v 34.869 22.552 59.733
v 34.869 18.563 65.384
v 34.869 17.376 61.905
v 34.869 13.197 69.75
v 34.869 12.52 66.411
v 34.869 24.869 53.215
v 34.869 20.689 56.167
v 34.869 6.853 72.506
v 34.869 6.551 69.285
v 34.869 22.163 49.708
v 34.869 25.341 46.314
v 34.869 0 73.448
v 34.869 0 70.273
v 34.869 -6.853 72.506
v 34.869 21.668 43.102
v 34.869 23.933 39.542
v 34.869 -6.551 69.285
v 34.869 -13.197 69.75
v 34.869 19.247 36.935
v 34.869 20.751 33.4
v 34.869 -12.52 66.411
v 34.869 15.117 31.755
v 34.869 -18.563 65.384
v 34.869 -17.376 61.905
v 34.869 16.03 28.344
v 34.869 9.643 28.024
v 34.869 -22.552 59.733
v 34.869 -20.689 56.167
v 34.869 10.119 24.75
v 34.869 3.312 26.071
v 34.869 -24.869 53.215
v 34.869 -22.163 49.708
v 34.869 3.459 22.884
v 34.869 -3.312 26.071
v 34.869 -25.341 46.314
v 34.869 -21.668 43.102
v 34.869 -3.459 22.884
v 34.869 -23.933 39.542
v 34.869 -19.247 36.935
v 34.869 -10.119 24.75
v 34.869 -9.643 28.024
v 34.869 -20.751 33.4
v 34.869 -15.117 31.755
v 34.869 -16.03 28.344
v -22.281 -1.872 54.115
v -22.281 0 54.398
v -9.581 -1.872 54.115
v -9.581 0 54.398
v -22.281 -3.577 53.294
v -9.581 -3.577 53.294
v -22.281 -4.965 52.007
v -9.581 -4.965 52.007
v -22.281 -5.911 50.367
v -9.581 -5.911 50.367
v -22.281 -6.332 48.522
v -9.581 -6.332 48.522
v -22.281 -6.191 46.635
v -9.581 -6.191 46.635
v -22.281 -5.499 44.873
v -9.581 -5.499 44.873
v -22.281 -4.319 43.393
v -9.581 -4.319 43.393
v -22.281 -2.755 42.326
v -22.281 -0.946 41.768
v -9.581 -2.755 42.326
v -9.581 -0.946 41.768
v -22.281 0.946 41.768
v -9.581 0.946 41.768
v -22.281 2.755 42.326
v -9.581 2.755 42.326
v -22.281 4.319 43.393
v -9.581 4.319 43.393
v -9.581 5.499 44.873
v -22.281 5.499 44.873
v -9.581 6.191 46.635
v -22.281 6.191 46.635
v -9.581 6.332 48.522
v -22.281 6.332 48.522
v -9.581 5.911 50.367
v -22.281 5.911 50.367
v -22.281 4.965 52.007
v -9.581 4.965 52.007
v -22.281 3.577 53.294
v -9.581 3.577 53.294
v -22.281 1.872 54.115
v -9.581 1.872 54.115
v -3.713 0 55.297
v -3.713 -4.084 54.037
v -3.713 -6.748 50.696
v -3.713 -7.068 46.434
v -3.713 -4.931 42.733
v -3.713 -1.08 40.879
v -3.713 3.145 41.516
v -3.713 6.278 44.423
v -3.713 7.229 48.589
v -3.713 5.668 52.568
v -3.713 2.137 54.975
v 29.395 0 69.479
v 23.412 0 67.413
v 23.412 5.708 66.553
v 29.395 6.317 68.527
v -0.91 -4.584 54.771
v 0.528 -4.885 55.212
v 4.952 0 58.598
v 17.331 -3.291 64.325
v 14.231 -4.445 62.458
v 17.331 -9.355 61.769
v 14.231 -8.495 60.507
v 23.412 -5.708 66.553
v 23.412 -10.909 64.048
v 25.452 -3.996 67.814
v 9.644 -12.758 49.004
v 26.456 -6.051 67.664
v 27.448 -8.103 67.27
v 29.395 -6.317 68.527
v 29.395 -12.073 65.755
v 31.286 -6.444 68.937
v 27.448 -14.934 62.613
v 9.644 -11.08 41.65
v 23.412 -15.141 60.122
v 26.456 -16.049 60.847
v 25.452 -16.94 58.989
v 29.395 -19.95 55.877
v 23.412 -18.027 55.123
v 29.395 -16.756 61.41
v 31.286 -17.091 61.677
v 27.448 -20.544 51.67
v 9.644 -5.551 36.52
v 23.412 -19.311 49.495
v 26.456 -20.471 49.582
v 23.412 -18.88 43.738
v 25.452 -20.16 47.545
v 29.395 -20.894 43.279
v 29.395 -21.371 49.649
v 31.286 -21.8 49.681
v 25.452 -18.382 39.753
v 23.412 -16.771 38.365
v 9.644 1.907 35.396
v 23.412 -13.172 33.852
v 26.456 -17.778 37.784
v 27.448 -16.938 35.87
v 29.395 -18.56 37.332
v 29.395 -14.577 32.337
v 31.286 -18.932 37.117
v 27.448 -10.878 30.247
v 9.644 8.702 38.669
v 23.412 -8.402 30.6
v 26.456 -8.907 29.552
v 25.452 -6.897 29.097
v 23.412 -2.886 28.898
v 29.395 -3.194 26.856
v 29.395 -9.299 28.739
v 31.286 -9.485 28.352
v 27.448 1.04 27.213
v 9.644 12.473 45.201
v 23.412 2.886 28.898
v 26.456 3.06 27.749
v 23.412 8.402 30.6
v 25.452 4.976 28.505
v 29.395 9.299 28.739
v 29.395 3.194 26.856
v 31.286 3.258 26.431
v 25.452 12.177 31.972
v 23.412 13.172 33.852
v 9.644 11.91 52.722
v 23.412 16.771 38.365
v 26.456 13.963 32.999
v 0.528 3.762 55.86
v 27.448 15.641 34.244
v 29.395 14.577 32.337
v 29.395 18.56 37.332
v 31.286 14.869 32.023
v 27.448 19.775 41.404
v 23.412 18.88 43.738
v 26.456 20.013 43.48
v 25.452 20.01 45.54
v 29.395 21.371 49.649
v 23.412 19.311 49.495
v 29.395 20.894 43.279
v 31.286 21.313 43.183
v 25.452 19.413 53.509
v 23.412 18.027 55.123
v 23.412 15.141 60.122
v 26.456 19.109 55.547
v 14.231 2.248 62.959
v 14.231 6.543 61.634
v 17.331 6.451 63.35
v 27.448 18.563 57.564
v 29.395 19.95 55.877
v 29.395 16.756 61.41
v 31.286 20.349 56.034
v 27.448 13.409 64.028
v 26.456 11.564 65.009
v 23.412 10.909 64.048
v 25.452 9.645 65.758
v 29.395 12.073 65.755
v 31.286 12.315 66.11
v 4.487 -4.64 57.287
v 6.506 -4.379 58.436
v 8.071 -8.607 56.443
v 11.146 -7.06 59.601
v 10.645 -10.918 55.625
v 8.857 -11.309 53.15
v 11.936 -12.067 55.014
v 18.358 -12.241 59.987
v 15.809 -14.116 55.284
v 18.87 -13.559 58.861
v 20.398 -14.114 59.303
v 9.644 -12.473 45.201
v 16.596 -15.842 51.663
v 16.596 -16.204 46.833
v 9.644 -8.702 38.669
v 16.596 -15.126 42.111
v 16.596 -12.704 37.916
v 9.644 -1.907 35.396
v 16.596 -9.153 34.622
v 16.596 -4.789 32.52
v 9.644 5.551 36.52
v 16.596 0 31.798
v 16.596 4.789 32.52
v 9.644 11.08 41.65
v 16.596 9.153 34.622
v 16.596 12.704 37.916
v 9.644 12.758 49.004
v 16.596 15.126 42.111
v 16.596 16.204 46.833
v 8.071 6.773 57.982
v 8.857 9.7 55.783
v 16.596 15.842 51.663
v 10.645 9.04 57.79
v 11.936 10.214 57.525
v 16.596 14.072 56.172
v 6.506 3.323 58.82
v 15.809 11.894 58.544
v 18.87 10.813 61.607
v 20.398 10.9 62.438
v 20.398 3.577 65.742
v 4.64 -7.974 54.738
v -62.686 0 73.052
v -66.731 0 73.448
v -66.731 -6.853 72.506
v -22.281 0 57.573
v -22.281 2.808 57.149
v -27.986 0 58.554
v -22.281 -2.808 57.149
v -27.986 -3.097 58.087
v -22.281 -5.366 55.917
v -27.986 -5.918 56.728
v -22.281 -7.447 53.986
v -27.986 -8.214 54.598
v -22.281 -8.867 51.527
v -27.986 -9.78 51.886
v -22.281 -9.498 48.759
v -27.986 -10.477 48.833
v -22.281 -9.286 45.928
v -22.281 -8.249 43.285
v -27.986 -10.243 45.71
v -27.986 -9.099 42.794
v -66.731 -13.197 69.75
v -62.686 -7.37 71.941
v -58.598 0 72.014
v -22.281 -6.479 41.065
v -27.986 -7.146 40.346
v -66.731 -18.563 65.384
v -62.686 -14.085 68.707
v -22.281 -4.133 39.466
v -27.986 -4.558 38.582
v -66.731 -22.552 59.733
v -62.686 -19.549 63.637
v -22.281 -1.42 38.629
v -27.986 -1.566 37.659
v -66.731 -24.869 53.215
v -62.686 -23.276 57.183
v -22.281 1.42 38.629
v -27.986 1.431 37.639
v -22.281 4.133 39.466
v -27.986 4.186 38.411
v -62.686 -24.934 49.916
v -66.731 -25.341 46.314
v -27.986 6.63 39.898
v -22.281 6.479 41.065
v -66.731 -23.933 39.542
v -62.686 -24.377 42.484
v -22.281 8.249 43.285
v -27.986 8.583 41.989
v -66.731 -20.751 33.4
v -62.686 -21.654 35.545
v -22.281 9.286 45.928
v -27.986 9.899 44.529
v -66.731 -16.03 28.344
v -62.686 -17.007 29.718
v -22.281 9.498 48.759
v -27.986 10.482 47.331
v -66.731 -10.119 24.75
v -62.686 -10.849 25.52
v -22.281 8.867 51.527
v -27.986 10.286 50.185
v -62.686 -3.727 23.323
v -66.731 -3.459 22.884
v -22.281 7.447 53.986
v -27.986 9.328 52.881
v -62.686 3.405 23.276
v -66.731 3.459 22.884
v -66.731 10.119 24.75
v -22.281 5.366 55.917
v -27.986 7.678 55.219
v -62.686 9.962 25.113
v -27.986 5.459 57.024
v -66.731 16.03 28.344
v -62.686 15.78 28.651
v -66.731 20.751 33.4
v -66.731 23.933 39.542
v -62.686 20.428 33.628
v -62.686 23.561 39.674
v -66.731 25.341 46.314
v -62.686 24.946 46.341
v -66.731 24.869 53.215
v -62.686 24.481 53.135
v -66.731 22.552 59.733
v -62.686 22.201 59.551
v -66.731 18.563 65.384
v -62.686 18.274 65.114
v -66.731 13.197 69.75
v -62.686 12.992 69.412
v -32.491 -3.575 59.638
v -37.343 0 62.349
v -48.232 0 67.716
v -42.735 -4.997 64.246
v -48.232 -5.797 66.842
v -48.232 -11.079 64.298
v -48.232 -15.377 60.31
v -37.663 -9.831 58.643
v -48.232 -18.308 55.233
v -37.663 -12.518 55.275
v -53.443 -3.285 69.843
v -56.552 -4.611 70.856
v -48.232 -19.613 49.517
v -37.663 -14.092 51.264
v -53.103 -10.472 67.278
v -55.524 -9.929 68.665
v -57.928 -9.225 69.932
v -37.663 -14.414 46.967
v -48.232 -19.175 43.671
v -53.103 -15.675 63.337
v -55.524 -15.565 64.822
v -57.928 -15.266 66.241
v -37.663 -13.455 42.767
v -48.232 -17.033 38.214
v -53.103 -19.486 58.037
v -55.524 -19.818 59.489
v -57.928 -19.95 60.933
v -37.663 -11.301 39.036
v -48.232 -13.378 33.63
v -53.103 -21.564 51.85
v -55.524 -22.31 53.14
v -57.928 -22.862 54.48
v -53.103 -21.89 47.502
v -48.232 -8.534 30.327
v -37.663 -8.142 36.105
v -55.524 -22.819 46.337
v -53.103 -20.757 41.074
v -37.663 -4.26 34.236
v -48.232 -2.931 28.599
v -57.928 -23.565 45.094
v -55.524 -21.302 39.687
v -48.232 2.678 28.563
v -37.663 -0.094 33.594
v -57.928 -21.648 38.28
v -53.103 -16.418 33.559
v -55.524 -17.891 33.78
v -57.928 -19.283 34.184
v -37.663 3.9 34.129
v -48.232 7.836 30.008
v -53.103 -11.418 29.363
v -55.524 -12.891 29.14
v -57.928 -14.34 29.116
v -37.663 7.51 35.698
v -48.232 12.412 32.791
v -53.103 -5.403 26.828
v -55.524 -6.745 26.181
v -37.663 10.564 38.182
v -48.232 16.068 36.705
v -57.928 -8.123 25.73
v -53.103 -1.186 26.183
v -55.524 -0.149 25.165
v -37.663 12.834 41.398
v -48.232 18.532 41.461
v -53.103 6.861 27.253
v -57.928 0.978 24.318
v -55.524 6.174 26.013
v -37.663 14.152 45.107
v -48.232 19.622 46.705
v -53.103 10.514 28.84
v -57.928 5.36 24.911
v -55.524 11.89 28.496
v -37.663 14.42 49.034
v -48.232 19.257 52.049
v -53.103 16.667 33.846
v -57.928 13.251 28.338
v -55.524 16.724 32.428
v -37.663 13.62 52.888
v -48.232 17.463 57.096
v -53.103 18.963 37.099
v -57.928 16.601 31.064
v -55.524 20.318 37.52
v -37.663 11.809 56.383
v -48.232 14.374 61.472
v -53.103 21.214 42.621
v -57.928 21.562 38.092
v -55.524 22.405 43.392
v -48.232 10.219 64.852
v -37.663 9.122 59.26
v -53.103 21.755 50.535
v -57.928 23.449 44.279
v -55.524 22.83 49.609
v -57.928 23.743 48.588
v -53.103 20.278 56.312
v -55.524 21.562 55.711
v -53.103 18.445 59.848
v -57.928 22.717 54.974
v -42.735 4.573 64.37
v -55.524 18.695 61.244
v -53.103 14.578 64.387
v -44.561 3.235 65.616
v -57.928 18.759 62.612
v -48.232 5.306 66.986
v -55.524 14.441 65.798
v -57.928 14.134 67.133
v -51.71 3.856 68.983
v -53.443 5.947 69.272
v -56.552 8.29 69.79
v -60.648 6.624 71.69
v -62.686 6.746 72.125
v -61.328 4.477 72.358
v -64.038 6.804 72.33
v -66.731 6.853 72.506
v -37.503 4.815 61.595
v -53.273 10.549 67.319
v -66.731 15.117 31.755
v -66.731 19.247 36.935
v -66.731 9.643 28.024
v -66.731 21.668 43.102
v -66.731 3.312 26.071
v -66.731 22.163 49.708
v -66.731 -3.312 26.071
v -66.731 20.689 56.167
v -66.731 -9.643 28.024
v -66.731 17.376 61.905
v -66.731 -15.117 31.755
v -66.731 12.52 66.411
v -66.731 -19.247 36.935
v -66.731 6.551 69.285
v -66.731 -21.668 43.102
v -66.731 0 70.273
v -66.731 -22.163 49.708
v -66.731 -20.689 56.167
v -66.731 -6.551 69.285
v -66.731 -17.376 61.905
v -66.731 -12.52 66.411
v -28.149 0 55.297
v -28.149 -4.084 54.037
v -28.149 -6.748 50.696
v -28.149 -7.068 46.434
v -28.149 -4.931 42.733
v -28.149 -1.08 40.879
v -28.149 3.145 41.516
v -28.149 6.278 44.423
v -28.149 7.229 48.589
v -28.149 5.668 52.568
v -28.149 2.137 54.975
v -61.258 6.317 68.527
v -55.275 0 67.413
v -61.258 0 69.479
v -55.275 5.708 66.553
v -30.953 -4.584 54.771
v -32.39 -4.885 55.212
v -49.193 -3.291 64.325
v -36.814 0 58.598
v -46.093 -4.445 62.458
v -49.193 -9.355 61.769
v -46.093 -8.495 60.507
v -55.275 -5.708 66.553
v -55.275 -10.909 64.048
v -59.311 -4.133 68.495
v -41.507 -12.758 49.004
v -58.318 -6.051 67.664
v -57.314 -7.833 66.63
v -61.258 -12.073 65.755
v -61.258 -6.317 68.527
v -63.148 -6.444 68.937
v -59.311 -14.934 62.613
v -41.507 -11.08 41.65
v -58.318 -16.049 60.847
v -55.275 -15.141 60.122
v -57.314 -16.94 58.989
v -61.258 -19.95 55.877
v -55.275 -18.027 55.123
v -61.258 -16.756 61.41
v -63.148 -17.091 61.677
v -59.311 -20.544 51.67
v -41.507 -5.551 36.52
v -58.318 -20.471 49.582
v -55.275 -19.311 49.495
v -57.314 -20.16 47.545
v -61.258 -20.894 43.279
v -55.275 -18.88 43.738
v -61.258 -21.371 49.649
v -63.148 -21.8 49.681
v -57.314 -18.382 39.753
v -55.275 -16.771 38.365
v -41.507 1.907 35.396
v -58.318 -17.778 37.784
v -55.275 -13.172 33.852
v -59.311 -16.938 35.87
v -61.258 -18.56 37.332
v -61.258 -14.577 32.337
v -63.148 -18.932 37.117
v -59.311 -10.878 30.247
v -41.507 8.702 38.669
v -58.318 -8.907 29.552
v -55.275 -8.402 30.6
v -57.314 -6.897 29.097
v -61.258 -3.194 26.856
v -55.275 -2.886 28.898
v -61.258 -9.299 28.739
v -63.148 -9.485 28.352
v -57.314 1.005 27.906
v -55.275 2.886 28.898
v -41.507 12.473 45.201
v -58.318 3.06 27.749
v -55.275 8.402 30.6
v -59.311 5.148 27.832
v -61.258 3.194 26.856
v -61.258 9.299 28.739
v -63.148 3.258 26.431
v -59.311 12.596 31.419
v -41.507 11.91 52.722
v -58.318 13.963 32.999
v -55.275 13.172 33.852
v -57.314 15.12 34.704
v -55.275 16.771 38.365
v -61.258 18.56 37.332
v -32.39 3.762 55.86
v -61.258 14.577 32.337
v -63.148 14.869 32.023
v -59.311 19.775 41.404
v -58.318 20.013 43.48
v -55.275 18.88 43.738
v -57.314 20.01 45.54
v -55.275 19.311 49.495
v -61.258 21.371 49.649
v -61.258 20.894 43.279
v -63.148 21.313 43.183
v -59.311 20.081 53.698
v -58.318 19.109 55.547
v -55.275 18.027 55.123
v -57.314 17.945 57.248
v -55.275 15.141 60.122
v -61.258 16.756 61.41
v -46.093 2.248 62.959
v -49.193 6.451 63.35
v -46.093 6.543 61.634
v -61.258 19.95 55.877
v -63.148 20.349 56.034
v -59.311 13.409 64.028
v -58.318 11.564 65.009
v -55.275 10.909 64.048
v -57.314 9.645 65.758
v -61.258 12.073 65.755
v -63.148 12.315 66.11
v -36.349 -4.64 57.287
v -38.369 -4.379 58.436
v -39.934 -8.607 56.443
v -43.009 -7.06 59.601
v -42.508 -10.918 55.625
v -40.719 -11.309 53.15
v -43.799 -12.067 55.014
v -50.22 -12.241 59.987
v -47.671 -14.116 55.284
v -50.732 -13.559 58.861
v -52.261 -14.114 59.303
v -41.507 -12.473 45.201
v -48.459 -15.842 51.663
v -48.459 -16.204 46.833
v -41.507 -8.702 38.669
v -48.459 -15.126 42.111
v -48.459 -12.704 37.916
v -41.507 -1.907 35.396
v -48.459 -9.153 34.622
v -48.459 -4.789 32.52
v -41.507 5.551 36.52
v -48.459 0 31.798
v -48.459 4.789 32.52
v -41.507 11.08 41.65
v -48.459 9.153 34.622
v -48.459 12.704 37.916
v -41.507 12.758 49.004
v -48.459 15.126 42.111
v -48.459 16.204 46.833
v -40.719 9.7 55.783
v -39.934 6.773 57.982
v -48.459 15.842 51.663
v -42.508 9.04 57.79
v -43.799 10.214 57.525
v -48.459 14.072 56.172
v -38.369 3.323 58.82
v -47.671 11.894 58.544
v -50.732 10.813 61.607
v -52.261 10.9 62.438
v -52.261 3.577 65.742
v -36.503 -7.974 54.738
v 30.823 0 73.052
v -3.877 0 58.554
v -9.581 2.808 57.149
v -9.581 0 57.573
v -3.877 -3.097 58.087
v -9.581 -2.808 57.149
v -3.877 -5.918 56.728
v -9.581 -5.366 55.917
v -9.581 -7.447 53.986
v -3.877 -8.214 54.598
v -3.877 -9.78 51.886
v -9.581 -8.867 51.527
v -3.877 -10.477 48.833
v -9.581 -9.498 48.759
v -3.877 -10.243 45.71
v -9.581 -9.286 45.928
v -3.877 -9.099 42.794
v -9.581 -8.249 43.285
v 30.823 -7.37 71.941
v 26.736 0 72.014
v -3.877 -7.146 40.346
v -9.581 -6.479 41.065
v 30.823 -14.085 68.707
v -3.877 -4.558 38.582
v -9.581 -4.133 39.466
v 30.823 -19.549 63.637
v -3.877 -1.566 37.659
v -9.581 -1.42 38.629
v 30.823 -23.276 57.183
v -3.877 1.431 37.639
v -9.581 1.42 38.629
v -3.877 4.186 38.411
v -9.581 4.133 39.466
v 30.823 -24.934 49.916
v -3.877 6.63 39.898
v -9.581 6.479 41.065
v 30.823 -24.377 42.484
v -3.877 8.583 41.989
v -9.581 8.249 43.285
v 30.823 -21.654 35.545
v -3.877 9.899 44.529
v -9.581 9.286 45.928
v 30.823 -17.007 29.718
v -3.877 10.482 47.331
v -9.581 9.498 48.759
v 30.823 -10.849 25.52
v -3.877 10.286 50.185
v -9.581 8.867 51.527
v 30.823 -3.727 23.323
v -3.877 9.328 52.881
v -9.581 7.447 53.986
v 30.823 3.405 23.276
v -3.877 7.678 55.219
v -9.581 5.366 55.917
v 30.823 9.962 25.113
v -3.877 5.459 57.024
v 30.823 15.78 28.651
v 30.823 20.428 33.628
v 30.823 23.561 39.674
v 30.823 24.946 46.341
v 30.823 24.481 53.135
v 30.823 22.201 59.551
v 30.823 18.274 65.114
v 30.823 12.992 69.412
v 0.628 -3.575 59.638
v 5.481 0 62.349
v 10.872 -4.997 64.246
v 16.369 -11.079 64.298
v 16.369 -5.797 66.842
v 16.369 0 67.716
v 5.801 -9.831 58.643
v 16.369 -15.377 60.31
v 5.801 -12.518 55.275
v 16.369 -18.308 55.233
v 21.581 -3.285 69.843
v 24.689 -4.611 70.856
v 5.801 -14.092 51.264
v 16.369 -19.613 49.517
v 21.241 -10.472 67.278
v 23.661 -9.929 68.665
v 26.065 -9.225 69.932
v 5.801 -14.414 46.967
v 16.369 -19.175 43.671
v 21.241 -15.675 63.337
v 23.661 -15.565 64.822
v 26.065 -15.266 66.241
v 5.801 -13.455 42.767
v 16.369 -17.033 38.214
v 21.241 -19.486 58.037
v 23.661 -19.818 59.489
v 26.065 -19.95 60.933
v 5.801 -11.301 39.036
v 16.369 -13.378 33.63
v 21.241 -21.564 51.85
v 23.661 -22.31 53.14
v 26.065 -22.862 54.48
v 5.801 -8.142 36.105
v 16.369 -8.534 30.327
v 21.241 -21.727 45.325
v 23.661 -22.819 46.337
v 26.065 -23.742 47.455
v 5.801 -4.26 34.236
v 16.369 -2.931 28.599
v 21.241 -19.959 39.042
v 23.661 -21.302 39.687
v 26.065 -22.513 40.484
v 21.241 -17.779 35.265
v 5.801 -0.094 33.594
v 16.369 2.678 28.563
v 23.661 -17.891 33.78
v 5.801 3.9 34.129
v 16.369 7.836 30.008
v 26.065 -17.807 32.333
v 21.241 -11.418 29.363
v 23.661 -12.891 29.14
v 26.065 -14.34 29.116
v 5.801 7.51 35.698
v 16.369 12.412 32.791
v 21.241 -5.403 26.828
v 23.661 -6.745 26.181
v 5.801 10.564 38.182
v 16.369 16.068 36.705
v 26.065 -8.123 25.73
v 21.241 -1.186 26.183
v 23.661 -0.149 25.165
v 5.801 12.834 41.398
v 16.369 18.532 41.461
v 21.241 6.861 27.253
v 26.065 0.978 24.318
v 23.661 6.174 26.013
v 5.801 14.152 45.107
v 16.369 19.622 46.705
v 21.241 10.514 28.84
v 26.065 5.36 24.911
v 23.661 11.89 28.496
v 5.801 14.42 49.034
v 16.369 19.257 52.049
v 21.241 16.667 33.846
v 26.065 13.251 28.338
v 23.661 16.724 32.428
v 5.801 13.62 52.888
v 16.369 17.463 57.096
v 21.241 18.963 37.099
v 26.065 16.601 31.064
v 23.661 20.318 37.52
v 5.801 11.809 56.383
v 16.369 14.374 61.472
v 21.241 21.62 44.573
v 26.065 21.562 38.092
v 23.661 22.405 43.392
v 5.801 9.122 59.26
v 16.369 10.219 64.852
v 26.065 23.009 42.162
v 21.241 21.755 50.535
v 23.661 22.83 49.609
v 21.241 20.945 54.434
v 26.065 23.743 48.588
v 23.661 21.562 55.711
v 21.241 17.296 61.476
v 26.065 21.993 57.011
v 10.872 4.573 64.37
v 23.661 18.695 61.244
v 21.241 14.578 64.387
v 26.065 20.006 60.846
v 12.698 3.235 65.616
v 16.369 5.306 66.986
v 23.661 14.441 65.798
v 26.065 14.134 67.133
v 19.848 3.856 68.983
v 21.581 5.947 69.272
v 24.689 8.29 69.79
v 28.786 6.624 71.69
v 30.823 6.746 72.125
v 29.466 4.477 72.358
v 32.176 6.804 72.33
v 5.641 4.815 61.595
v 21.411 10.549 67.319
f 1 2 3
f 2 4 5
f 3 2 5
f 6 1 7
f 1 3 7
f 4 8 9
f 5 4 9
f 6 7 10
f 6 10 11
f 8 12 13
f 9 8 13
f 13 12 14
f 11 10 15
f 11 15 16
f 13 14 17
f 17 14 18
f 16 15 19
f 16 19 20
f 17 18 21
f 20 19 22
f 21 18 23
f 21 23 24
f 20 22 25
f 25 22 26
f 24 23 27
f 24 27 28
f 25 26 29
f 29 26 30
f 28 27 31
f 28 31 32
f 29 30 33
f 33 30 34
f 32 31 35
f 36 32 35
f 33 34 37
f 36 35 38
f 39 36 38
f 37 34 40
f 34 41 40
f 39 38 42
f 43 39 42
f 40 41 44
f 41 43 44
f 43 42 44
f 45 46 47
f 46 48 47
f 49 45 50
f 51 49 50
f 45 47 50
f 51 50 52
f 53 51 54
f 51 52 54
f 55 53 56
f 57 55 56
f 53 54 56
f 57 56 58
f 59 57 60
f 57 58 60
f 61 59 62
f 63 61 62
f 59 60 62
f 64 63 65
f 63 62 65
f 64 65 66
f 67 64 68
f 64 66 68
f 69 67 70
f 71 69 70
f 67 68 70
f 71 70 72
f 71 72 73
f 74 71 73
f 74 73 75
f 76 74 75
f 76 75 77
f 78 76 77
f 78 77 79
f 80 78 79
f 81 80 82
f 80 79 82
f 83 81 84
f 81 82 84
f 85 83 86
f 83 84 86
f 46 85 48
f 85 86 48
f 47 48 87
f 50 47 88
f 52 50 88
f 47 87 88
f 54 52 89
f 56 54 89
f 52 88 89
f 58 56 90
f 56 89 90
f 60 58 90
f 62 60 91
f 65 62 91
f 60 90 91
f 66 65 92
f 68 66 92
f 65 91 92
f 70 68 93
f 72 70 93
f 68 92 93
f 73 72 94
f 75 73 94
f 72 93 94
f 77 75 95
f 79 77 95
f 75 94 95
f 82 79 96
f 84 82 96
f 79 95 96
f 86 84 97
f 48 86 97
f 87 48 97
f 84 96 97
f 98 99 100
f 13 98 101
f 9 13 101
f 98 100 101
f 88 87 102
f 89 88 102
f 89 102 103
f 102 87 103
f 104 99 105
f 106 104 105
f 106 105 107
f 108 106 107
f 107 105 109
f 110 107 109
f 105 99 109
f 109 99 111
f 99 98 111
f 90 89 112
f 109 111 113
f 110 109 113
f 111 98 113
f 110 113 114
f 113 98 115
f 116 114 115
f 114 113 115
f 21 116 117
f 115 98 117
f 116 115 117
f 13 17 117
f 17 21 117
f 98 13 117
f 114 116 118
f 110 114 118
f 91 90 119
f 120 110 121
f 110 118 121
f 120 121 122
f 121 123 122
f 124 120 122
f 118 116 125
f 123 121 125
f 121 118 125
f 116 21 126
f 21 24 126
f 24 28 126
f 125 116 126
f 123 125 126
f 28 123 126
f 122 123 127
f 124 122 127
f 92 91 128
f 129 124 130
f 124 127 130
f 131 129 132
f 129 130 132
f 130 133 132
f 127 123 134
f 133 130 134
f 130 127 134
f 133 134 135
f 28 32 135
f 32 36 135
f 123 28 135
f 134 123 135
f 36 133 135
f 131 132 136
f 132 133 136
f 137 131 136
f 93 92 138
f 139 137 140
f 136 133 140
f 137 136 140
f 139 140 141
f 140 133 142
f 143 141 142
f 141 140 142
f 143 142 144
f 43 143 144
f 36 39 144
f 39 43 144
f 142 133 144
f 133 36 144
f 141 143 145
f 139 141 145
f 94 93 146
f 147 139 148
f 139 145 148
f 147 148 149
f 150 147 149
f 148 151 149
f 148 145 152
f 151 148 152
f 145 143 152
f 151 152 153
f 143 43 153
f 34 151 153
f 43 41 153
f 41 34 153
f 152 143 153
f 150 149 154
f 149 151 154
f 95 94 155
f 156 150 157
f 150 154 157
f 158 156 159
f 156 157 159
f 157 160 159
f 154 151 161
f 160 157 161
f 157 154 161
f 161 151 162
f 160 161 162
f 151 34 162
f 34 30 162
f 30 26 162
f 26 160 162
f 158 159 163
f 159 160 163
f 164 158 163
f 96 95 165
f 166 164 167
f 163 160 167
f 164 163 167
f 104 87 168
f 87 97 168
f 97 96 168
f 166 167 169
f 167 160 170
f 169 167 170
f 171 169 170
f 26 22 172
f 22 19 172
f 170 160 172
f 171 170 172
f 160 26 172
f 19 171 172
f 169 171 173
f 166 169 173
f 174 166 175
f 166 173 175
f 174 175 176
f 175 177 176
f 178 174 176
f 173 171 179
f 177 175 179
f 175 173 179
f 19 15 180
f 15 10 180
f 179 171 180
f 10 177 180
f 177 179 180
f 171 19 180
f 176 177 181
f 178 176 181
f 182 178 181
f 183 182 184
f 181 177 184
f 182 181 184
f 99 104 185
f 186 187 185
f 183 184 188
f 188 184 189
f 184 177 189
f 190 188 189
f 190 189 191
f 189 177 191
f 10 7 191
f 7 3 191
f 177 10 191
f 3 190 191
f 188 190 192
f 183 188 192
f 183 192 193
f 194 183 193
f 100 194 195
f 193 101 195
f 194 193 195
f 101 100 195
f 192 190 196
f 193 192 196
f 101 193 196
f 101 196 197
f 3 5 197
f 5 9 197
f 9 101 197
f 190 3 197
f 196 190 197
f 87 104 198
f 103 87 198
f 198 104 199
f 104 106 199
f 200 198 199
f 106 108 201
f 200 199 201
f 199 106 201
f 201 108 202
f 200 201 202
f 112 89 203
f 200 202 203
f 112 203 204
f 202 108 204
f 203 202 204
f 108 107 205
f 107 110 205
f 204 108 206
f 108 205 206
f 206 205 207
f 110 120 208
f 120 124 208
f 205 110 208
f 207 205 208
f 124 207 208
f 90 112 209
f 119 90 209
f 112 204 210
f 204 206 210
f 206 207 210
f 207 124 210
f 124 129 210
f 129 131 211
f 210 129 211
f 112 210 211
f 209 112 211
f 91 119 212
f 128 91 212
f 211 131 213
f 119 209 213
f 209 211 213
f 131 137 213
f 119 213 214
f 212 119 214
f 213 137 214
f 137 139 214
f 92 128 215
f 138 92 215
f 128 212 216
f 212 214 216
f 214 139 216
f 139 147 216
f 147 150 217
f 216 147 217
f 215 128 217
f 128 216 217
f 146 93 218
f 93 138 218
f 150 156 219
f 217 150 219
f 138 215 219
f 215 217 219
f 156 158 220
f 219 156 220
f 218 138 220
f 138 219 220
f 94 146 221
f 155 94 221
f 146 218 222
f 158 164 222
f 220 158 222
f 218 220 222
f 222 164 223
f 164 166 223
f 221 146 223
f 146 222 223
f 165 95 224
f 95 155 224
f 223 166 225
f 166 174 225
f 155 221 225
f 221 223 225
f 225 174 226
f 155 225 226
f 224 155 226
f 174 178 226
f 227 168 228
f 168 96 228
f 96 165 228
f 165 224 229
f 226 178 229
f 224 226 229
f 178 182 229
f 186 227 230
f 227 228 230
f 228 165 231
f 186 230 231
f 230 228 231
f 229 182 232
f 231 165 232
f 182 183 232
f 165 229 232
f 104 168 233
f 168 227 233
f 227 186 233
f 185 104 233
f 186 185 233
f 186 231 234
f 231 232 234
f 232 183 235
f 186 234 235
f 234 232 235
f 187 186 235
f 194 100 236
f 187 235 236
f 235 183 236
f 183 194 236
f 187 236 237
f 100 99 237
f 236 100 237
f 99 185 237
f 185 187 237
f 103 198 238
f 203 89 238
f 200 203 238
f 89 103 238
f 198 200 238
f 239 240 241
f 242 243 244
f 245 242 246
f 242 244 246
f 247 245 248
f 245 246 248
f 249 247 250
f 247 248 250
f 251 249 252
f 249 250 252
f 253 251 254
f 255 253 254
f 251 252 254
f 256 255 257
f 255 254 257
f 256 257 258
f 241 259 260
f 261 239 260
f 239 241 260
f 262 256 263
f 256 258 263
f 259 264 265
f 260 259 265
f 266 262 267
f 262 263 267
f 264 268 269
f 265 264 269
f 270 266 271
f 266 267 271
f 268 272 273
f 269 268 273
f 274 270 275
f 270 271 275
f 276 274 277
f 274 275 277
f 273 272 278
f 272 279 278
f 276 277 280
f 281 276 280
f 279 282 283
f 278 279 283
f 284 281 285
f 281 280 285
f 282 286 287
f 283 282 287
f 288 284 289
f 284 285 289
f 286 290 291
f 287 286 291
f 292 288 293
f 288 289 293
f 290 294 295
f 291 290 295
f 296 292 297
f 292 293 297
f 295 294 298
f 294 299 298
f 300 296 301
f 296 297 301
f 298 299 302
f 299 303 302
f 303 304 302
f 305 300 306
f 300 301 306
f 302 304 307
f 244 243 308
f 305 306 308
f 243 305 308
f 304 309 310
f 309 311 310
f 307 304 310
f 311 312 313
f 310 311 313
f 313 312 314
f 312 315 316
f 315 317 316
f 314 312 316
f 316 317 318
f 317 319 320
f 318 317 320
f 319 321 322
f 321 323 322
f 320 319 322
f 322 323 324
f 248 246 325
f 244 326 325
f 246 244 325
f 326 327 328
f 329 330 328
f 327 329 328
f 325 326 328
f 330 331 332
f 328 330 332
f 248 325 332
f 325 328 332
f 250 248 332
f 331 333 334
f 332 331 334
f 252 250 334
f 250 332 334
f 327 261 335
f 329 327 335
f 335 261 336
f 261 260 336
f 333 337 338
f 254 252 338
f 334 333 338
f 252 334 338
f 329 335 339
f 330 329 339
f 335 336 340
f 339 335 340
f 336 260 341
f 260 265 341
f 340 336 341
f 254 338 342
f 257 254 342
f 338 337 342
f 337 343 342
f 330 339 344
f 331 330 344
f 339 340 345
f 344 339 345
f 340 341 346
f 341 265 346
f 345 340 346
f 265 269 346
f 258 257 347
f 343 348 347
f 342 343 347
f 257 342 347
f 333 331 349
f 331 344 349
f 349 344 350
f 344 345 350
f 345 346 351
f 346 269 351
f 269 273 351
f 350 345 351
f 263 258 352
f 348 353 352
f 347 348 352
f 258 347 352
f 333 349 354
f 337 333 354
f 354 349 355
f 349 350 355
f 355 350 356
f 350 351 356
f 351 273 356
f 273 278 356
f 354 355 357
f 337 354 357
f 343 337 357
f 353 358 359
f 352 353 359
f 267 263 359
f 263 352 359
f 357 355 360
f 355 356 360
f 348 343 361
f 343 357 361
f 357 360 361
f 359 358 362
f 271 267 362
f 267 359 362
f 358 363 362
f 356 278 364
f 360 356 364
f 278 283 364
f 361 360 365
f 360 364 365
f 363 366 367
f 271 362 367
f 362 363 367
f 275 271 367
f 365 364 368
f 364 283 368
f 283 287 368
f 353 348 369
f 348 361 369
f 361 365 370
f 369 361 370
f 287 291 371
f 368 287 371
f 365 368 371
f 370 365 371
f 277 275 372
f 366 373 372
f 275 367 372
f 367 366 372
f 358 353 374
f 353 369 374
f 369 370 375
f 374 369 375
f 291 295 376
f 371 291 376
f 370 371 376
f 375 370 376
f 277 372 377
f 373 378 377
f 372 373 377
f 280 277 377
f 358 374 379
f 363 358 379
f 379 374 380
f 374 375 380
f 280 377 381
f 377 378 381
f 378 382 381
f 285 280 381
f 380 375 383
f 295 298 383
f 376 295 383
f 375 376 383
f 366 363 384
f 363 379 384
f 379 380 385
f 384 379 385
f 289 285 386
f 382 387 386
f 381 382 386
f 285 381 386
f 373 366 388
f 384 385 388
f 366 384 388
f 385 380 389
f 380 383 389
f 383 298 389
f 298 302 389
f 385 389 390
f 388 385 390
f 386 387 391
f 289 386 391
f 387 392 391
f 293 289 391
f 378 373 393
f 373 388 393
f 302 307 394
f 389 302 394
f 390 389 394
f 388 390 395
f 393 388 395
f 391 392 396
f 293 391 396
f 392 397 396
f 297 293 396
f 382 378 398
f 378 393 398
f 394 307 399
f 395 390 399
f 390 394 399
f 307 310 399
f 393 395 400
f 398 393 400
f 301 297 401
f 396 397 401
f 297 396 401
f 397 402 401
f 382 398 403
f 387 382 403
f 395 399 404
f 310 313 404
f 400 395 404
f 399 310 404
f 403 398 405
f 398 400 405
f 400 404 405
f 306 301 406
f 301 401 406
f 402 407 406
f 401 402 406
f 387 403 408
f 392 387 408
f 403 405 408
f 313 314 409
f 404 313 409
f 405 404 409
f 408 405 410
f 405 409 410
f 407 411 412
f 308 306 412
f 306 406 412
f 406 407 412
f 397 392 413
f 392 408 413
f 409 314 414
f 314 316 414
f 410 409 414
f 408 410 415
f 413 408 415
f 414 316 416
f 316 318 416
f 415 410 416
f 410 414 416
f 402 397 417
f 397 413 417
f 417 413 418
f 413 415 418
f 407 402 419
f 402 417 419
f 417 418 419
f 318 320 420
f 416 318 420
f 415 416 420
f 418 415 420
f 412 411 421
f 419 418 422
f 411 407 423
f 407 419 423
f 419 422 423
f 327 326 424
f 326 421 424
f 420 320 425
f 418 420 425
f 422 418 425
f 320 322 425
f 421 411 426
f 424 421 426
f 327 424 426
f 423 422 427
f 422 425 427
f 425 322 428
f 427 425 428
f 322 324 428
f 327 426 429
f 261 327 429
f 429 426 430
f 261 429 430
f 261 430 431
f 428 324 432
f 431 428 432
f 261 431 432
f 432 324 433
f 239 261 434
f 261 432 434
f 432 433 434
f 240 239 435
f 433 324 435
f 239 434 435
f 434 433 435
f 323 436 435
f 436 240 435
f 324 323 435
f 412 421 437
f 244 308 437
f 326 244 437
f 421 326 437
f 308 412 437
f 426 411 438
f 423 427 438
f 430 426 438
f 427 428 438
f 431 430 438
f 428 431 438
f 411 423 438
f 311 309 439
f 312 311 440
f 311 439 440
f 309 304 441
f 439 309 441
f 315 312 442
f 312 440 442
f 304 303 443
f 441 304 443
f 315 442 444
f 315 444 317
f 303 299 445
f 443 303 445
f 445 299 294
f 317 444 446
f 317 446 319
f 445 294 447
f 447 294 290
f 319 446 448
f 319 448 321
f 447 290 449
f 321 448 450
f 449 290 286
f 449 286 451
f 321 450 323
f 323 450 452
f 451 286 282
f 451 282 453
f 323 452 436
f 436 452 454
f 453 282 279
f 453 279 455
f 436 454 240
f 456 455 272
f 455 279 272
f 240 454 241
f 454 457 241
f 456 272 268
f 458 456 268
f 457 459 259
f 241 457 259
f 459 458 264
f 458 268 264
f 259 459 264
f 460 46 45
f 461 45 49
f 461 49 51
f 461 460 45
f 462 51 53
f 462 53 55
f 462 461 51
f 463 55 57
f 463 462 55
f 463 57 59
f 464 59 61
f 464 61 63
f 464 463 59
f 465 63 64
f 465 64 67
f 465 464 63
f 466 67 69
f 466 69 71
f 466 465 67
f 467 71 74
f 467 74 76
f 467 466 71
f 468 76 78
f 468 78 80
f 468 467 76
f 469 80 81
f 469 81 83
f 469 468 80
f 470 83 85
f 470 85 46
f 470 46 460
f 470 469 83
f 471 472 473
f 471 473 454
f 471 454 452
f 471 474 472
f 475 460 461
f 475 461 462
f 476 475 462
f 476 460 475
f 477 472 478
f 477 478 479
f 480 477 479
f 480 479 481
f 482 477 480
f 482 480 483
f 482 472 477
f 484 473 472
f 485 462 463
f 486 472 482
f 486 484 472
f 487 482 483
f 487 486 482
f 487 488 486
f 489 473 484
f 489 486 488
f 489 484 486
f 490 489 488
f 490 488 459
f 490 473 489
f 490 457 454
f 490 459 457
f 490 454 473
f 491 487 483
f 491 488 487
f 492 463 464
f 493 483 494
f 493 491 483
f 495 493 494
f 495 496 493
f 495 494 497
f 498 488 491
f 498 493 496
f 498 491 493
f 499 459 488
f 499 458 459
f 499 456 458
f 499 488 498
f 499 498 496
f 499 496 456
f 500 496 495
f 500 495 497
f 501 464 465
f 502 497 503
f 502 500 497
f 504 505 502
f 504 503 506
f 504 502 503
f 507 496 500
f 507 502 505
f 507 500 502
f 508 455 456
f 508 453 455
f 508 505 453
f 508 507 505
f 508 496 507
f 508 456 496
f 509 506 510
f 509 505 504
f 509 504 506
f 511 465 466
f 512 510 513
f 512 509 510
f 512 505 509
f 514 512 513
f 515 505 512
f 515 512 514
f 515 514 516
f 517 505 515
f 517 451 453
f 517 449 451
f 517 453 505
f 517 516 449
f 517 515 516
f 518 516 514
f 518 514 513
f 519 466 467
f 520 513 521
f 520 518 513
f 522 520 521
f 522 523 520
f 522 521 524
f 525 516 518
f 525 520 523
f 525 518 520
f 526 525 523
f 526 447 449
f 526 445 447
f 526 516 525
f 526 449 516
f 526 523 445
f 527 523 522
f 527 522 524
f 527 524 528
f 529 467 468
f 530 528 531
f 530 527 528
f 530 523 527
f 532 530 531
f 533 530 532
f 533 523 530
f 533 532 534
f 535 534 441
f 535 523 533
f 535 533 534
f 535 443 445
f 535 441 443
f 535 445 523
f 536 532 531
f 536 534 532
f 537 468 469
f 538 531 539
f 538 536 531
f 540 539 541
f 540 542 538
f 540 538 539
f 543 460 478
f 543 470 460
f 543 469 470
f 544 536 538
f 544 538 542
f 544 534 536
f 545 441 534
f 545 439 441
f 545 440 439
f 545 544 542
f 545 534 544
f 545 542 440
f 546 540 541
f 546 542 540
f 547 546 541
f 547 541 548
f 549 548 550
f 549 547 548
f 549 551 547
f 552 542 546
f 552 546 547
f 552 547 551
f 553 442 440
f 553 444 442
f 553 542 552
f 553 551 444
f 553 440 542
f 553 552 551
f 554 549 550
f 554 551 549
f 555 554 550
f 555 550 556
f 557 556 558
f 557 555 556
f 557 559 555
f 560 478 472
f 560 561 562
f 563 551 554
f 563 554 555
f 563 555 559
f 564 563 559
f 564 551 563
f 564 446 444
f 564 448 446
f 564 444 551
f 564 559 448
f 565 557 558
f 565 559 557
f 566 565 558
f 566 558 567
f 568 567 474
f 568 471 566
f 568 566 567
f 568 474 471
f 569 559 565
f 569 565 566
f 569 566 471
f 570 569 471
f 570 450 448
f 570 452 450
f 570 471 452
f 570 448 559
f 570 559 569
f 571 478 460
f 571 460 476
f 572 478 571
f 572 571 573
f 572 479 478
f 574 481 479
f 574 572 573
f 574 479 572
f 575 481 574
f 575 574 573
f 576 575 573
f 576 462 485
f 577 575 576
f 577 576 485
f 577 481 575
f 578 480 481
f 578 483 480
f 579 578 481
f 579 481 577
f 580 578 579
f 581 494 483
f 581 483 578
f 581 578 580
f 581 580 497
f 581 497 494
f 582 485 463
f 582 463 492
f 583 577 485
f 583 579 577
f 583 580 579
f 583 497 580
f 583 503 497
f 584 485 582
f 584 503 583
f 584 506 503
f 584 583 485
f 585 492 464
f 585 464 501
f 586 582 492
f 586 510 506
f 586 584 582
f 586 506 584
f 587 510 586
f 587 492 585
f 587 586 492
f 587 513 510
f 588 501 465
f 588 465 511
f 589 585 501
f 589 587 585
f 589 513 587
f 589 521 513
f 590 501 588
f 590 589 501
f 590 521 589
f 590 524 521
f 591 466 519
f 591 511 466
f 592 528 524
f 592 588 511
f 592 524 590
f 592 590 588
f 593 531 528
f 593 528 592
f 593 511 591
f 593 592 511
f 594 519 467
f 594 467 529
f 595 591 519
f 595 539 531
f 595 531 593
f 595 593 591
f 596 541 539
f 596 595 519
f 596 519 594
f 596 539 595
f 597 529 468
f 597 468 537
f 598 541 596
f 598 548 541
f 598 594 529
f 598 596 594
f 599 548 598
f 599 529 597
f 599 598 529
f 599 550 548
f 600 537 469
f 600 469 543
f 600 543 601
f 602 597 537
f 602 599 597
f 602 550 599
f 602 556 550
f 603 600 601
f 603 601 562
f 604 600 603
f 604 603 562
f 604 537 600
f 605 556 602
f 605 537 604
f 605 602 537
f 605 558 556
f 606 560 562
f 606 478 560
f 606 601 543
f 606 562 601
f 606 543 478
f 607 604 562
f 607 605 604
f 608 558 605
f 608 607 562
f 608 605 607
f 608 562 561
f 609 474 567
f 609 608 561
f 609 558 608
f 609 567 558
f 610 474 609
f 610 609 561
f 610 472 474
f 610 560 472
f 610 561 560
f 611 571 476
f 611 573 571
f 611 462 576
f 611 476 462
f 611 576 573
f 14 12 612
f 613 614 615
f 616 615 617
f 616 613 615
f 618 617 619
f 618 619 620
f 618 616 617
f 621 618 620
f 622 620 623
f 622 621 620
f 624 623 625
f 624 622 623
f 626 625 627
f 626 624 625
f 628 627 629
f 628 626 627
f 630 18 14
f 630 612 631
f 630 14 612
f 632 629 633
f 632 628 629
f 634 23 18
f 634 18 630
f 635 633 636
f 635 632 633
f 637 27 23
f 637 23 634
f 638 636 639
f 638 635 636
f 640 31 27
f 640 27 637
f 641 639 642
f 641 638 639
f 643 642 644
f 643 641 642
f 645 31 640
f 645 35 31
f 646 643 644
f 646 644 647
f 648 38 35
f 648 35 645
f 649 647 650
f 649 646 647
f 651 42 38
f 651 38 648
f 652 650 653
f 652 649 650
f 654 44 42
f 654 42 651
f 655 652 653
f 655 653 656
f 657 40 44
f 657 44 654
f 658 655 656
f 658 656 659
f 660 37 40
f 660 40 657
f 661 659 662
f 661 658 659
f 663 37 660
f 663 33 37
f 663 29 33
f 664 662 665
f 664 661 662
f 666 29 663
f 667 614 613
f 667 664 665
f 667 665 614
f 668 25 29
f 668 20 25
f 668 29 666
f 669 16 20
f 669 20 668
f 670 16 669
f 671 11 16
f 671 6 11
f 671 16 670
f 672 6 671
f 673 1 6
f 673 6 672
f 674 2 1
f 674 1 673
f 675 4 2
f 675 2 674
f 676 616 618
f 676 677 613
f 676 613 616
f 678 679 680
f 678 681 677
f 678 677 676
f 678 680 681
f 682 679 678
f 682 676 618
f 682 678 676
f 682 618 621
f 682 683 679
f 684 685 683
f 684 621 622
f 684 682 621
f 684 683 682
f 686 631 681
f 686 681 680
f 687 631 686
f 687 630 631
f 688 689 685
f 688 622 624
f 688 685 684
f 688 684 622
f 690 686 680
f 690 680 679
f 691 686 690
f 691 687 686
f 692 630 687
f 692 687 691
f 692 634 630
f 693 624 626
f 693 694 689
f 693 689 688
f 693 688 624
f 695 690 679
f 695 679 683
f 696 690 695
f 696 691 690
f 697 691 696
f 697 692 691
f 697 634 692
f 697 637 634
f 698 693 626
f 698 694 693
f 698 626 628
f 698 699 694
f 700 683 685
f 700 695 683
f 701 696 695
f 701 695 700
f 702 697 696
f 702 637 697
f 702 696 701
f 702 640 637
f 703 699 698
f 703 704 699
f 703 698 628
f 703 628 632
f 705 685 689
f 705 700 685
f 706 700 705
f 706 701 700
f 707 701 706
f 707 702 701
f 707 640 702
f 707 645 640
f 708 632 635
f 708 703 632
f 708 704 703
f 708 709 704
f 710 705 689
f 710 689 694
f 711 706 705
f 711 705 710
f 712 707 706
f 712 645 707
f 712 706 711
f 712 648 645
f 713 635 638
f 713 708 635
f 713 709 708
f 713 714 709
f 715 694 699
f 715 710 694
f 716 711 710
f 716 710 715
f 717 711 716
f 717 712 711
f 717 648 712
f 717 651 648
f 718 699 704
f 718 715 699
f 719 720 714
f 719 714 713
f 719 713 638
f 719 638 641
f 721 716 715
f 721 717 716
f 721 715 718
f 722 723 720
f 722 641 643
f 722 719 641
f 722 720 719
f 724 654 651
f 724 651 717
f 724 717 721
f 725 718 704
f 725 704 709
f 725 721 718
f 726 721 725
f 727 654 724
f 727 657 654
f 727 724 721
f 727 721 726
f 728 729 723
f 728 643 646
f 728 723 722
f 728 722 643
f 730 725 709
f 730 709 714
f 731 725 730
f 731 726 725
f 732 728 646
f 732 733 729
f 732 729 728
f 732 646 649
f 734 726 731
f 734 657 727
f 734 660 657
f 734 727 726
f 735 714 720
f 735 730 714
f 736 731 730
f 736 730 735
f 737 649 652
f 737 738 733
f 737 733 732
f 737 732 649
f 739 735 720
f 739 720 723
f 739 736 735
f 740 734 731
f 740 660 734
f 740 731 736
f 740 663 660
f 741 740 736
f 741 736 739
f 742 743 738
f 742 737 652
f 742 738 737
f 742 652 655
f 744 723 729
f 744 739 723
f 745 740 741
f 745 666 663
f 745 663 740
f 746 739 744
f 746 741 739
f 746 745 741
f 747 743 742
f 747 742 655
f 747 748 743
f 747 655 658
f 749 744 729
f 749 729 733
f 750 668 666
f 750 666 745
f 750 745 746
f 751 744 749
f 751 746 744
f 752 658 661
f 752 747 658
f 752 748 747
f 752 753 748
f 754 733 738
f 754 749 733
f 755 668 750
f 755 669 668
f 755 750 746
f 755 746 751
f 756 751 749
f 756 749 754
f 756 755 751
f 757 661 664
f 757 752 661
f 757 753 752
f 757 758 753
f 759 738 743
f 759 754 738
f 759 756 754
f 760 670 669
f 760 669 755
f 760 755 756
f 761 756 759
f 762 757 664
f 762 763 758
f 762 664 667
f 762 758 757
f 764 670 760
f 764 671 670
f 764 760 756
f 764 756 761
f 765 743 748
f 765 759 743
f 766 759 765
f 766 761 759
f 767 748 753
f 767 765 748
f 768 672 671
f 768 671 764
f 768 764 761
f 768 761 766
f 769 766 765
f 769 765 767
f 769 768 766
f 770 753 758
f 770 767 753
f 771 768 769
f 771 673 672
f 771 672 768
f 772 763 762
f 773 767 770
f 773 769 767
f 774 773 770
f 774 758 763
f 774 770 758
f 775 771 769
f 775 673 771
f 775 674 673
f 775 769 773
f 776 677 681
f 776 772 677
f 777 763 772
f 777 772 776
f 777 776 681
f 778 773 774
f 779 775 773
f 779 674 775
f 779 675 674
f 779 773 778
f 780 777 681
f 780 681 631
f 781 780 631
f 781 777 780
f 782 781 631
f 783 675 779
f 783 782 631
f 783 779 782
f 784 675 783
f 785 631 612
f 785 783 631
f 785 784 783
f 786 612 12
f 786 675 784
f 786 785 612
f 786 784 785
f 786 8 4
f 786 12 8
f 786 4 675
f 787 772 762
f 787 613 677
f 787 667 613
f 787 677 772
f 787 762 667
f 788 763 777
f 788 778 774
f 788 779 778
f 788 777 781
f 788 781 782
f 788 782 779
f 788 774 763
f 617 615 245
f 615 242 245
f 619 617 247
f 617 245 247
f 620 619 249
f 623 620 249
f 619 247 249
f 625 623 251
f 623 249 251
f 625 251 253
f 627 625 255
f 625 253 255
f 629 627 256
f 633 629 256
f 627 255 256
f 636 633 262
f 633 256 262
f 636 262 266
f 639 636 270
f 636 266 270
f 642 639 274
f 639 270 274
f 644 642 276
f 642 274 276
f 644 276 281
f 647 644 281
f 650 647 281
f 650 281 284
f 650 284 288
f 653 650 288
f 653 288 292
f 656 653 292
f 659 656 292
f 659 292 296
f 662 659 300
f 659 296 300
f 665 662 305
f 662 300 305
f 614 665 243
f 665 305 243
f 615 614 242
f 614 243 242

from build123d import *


# Not quite as in the source:
# - the dataset's text gives a spline's control points without its knots; the knots are read off the source's solid


with BuildPart() as f1:
    # F0 (on Front) → F1 (revolve)
    with BuildSketch(Plane.XZ):
        with BuildLine():
            Line((-66.7312243659, 73.4475515783), (-66.7312243659, 70.2725515783))
            add(Edge.make_bspline(
                [(-22.2812243659, 54.3975515783), (-34.9812243659, 54.3975515783), (-54.0312243659, 70.2725515783), (-66.7312243659, 70.2725515783)],
                knots=[0, 0, 0, 0, 47.1997682727, 47.1997682727, 47.1997682727, 47.1997682727], degree=3))
            Line((-22.2812243659, 54.3975515783), (-15.9312243659, 54.3975515783))
            Line((-15.9312243659, 54.3975515783), (-9.5812243659, 54.3975515783))
            add(Edge.make_bspline(
                [(-9.5812243659, 54.3975515783), (3.1187756341, 54.3975515783), (22.1687756341, 70.2725515783), (34.8687756341, 70.2725515783)],
                knots=[0, 0, 0, 0, 47.1997682727, 47.1997682727, 47.1997682727, 47.1997682727], degree=3))
            Line((34.8687756341, 70.2725515783), (34.8687756341, 73.4475515783))
            add(Edge.make_bspline(
                [(-9.5812243659, 57.5725515783), (-8.9528389492, 57.5725515783), (-7.604333407, 57.6714587753), (-4.5835276431, 58.2645427279), (-0.3121287775, 59.6981220412), (5.3075788443, 62.217263906), (11.2054567804, 65.1653736616), (17.2138288443, 68.170388906), (23.2027149725, 70.8602314162), (28.1090504819, 72.5272380404), (31.983947843, 73.2984119003), (33.9096610508, 73.4475515783), (34.8687756341, 73.4475515783)],
                knots=[0, 0, 0, 0, 0.0625, 0.125, 0.25, 0.375, 0.5, 0.625, 0.75, 0.875, 0.9375, 1, 1, 1, 1], degree=3))
            Line((-9.5812243659, 57.5725515783), (-15.9312243659, 57.5725515783))
            Line((-15.9312243659, 57.5725515783), (-22.2812243659, 57.5725515783))
            add(Edge.make_bspline(
                [(-22.2812243659, 57.5725515783), (-22.9096097826, 57.5725515783), (-24.2581153248, 57.6714587753), (-27.2789210887, 58.2645427279), (-31.5503199543, 59.6981220412), (-37.1700275761, 62.217263906), (-43.0679055123, 65.1653736616), (-49.0762775761, 68.170388906), (-55.0651637043, 70.8602314162), (-59.9714992137, 72.5272380404), (-63.8463965748, 73.2984119003), (-65.7721097826, 73.4475515783), (-66.7312243659, 73.4475515783)],
                knots=[0, 0, 0, 0, 0.0625, 0.125, 0.25, 0.375, 0.5, 0.625, 0.75, 0.875, 0.9375, 1, 1, 1, 1], degree=3))
        make_face()
    revolve(axis=Axis((-44.5062243659, 0, 48.0475515783), (1, 0, 0)))


solid = f1.part
